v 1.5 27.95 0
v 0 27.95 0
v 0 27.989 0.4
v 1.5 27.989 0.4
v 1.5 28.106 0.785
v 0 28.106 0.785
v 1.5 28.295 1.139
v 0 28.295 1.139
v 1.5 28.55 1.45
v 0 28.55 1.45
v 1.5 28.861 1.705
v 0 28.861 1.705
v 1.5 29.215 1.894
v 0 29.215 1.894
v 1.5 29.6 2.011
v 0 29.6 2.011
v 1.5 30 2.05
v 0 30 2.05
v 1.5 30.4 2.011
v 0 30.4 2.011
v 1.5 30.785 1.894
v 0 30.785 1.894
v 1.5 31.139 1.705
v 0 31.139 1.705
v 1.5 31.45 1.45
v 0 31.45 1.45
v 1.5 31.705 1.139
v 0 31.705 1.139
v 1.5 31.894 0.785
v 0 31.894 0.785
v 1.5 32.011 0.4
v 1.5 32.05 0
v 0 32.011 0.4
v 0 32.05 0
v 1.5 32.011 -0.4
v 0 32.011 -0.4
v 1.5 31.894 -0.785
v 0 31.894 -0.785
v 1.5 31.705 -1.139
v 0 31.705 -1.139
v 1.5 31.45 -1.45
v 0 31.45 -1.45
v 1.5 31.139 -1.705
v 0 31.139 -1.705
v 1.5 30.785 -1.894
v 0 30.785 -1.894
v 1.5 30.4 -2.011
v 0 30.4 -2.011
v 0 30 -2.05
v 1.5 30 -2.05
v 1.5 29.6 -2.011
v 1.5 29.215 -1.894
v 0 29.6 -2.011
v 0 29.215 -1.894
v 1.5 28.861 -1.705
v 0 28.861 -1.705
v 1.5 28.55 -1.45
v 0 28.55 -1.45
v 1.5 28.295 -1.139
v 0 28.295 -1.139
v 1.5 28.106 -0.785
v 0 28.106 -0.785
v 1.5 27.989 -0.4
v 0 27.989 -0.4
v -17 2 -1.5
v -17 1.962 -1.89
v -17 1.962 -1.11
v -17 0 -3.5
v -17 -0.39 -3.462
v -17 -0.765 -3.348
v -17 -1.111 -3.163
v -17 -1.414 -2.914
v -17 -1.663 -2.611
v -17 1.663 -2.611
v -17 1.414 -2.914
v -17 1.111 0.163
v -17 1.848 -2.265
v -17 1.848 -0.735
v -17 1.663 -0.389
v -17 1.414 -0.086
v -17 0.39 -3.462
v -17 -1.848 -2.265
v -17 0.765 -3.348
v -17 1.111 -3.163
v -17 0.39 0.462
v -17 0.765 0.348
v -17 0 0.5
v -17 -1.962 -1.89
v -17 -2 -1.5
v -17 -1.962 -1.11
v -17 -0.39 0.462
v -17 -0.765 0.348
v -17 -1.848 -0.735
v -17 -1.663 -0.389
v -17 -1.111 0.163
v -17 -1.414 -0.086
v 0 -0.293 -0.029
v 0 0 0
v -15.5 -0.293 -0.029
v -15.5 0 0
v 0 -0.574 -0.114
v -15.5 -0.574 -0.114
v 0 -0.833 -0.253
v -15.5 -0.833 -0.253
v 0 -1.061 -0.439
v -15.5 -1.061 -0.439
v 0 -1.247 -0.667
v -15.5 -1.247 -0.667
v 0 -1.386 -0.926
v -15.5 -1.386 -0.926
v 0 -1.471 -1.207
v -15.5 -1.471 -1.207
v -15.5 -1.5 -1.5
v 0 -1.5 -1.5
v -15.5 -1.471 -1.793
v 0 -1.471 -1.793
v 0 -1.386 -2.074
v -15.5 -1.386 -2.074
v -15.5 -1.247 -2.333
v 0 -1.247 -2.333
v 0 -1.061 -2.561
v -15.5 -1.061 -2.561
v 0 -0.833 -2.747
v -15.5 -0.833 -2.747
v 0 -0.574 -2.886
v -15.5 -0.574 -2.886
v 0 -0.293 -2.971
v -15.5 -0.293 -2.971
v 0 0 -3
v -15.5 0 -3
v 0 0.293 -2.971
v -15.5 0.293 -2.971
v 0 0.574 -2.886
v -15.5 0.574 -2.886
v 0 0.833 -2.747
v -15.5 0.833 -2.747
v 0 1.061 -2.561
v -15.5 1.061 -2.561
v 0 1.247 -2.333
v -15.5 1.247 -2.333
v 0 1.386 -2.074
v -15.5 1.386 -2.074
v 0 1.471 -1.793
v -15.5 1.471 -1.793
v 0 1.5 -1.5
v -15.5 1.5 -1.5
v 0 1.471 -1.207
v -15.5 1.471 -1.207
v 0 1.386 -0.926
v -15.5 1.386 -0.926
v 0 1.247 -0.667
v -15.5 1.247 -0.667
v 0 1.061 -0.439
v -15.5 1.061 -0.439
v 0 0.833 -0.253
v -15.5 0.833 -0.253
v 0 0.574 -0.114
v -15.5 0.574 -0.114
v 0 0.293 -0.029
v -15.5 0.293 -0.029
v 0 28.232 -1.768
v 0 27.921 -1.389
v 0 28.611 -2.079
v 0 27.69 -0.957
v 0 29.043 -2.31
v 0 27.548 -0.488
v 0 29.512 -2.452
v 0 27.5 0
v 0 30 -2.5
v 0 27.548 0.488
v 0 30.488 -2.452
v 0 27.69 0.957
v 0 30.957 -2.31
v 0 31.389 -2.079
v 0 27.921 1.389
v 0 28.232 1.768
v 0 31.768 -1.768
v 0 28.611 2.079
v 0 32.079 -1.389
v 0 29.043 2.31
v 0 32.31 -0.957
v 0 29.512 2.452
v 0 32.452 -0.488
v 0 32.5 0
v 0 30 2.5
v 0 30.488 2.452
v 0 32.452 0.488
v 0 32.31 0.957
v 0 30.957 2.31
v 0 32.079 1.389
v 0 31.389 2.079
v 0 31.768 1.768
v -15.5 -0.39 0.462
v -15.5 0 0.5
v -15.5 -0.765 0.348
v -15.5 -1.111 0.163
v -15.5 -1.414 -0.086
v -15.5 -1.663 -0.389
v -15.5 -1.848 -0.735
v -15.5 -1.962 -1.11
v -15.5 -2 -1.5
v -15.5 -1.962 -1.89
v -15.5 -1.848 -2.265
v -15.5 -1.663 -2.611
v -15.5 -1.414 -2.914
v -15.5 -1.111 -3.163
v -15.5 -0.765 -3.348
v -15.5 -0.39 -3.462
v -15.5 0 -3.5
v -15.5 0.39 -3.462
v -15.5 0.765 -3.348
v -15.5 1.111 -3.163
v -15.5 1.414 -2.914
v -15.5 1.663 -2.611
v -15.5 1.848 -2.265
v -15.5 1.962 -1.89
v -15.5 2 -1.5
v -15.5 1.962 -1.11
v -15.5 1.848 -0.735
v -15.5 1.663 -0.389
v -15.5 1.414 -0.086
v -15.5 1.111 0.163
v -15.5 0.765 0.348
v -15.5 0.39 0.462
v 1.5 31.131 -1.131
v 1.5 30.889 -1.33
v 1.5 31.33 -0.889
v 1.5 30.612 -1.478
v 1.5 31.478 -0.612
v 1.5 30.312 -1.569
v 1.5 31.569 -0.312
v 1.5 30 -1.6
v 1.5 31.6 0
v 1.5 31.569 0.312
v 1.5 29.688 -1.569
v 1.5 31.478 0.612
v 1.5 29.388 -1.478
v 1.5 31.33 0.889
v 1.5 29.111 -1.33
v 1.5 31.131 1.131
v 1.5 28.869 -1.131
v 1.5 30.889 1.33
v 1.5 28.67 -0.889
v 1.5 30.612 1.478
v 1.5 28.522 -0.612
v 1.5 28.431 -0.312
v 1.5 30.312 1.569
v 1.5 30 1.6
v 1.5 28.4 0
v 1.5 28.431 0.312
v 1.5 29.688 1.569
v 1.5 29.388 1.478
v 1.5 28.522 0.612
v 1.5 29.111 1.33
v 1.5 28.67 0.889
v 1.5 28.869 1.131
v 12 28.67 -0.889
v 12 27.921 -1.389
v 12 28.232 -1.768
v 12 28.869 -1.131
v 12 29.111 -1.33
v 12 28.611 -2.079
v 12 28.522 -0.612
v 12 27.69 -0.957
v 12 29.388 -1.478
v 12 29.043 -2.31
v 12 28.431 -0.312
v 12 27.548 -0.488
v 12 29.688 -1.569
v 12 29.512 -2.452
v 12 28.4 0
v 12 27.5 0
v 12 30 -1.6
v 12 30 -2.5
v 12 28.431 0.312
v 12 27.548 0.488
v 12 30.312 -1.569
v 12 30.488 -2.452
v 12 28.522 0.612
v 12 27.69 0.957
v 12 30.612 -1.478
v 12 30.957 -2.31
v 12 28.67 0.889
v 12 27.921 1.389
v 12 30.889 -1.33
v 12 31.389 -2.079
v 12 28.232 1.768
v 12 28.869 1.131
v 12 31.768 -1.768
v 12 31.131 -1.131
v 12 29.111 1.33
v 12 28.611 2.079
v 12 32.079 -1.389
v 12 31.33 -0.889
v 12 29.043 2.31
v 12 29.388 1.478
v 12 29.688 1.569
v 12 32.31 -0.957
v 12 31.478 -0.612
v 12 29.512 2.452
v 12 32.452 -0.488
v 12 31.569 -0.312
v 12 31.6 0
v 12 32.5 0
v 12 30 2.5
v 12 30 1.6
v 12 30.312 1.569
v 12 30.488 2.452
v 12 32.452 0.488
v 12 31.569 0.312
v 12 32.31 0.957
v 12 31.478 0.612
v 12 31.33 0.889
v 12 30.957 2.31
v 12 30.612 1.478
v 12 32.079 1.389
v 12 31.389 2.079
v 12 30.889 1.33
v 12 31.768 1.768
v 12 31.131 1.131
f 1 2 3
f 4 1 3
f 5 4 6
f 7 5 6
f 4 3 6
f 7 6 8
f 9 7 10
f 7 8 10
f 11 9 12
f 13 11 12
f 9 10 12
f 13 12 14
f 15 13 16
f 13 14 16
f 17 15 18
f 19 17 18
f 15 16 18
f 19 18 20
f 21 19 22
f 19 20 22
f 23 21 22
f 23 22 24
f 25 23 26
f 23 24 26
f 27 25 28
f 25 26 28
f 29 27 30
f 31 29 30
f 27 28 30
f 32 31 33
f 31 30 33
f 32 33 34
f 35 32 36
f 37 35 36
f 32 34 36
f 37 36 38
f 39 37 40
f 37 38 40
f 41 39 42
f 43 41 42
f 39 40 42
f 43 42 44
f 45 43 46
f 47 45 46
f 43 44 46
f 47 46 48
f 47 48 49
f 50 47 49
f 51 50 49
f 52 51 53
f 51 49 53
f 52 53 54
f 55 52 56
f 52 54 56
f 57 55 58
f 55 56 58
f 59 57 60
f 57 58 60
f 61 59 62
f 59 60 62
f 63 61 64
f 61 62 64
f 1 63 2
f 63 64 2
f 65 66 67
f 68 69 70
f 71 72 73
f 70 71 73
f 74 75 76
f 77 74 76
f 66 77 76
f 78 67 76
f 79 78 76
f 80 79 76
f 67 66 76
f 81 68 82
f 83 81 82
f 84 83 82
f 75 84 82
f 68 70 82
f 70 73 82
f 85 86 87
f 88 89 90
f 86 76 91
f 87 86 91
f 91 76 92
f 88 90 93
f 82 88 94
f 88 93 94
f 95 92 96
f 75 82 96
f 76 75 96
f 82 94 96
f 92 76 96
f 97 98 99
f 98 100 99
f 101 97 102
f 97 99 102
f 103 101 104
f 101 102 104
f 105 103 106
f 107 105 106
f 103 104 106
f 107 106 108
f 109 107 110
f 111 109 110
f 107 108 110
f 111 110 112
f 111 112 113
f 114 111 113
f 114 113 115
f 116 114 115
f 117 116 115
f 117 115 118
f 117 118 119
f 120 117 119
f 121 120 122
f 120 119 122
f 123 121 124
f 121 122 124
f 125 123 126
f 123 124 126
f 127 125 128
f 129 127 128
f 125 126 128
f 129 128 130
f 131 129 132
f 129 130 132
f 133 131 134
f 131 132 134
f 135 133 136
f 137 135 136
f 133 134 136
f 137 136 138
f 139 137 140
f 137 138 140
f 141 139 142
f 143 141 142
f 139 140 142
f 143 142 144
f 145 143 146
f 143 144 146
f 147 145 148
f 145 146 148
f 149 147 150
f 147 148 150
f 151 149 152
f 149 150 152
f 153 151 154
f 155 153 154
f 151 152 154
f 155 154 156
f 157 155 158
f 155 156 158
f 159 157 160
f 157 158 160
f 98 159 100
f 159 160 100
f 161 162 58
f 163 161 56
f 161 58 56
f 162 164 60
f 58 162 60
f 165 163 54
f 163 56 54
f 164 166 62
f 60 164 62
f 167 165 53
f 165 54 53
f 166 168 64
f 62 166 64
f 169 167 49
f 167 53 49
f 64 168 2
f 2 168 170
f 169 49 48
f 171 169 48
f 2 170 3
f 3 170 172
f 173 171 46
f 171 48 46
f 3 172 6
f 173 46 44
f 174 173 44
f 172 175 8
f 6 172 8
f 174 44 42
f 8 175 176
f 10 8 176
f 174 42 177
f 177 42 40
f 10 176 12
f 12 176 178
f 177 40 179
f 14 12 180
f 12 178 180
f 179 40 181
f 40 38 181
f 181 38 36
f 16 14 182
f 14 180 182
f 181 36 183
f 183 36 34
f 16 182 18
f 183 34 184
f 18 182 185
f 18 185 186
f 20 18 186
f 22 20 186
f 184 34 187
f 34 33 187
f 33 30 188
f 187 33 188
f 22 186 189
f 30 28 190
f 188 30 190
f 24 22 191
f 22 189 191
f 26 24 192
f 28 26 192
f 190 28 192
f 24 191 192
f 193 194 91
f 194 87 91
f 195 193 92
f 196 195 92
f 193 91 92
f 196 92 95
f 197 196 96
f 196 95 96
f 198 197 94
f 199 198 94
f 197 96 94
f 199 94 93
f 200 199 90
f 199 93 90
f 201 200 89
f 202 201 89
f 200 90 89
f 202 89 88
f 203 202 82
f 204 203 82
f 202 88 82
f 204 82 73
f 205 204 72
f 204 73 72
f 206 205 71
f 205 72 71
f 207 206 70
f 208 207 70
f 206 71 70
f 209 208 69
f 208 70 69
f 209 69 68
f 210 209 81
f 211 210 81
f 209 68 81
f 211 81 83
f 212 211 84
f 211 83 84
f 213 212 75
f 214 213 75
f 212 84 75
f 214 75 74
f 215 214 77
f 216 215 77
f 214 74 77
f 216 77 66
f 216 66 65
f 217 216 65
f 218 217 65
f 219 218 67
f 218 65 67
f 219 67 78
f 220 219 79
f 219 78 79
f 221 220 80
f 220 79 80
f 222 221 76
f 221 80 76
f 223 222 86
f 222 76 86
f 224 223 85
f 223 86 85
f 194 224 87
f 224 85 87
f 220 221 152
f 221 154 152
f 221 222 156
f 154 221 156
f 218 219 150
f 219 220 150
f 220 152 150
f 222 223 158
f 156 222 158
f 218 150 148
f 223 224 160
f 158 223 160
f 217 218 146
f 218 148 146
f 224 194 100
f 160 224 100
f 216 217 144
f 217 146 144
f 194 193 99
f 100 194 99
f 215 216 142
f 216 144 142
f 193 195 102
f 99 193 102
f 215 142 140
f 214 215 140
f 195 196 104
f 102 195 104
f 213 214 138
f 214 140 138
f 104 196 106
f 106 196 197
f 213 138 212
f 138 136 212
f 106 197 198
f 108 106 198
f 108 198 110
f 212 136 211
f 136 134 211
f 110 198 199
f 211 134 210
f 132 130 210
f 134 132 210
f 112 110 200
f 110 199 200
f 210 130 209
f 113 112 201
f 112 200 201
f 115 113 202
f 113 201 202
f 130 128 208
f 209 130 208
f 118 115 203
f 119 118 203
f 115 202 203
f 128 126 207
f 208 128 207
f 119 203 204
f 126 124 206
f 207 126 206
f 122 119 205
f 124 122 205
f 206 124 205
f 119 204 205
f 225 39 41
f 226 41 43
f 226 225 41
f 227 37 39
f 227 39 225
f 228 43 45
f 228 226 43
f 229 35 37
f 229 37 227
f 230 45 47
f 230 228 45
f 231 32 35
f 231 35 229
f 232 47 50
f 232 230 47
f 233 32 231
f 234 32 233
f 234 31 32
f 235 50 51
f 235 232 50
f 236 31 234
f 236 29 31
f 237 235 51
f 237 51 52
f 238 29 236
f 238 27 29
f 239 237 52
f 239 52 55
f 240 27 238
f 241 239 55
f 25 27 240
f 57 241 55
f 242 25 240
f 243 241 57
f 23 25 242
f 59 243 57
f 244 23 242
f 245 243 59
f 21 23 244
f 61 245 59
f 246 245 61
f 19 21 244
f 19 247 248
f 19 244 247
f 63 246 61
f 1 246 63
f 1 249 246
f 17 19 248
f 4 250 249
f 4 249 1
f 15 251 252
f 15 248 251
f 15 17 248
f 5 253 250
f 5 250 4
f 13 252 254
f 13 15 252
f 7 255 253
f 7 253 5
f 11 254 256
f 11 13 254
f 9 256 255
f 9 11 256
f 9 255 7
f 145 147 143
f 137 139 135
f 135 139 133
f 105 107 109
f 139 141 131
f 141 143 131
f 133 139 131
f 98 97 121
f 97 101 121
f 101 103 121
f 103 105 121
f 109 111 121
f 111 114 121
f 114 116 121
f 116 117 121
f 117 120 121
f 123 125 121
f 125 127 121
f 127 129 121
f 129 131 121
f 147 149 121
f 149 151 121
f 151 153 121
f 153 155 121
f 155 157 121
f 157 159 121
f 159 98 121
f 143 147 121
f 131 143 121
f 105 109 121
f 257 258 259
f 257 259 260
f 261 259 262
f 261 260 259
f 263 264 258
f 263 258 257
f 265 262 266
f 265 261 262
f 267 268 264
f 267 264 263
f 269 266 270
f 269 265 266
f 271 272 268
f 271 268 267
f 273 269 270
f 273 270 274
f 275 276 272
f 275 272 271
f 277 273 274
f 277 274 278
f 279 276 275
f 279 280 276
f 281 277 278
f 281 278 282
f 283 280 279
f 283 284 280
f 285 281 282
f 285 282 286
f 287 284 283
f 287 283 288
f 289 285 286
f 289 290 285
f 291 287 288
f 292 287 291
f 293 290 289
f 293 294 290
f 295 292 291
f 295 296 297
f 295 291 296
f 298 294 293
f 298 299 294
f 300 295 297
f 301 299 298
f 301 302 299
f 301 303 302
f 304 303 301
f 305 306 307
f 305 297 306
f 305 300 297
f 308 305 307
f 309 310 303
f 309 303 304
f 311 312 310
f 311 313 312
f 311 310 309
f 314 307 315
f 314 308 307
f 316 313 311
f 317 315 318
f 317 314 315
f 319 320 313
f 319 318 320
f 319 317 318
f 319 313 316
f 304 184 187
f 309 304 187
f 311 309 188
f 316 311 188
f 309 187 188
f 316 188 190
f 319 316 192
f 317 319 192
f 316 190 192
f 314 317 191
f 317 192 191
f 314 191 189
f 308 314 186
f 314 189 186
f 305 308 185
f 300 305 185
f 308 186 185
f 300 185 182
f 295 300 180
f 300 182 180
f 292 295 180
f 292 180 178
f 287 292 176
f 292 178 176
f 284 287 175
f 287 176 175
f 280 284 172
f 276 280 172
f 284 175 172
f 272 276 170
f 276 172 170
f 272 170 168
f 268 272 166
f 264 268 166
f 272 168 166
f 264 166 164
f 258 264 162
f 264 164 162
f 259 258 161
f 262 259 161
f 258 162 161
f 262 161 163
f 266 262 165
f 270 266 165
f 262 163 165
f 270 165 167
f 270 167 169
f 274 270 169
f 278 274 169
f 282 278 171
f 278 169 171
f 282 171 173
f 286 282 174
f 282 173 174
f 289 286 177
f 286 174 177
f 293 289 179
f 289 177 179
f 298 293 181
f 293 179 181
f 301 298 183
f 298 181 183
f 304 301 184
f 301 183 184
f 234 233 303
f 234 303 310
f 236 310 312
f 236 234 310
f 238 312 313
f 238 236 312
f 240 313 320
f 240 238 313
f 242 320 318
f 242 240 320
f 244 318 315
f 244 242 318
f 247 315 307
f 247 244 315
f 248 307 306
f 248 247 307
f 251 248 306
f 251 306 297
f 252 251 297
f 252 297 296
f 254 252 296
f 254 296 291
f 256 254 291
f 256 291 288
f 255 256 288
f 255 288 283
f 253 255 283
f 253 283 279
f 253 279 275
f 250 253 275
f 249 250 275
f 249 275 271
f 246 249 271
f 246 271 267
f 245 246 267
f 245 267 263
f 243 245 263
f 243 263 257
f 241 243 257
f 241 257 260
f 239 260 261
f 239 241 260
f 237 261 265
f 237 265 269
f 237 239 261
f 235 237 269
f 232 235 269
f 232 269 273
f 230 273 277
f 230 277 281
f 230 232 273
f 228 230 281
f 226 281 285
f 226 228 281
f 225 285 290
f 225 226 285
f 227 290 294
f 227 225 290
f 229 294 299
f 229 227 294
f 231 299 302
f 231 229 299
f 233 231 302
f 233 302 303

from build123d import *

# Parameters (mm, degrees)
F1_R     = 2.5
F1_R_2   = 1.6
F2_DEPTH = 12
F4_R     = 2.05
F4_R_2   = 1.6
F5_DEPTH = 1.5


with BuildPart() as f2:
    # F1 (on Right) → F2 (new body)
    with BuildSketch(Plane.YZ):
        with Locations((30, 0)):
            Circle(F1_R)
        with Locations((30, 0)):
            Circle(F1_R_2, mode=Mode.SUBTRACT)
    extrude(amount=F2_DEPTH)

    # F4 (on face) → F5 (cut)
    with BuildSketch(Plane(origin=(0, 0, 0), x_dir=(0, -1, 0), z_dir=(-1, 0, 0))):
        with Locations((-30, 0)):
            Circle(F4_R)
        with Locations((-30, 0)):
            Circle(F4_R_2, mode=Mode.SUBTRACT)
        with Locations((-30, 0)):
            Circle(F4_R_2)
    extrude(amount=-F5_DEPTH, mode=Mode.SUBTRACT)


with BuildPart() as f3:
    # F0 (on Front) → F3 (revolve)
    with BuildSketch(Plane.XZ):
        Polygon((0, -1.5), (0, 0), (-15.5, 0), (-15.5, 0.5), (-17, 0.5), (-17, -1.5), align=None)
    revolve(axis=Axis((-8.5, 0, -1.5), (1, 0, 0)))


solid = Compound([f2.part, f3.part])
